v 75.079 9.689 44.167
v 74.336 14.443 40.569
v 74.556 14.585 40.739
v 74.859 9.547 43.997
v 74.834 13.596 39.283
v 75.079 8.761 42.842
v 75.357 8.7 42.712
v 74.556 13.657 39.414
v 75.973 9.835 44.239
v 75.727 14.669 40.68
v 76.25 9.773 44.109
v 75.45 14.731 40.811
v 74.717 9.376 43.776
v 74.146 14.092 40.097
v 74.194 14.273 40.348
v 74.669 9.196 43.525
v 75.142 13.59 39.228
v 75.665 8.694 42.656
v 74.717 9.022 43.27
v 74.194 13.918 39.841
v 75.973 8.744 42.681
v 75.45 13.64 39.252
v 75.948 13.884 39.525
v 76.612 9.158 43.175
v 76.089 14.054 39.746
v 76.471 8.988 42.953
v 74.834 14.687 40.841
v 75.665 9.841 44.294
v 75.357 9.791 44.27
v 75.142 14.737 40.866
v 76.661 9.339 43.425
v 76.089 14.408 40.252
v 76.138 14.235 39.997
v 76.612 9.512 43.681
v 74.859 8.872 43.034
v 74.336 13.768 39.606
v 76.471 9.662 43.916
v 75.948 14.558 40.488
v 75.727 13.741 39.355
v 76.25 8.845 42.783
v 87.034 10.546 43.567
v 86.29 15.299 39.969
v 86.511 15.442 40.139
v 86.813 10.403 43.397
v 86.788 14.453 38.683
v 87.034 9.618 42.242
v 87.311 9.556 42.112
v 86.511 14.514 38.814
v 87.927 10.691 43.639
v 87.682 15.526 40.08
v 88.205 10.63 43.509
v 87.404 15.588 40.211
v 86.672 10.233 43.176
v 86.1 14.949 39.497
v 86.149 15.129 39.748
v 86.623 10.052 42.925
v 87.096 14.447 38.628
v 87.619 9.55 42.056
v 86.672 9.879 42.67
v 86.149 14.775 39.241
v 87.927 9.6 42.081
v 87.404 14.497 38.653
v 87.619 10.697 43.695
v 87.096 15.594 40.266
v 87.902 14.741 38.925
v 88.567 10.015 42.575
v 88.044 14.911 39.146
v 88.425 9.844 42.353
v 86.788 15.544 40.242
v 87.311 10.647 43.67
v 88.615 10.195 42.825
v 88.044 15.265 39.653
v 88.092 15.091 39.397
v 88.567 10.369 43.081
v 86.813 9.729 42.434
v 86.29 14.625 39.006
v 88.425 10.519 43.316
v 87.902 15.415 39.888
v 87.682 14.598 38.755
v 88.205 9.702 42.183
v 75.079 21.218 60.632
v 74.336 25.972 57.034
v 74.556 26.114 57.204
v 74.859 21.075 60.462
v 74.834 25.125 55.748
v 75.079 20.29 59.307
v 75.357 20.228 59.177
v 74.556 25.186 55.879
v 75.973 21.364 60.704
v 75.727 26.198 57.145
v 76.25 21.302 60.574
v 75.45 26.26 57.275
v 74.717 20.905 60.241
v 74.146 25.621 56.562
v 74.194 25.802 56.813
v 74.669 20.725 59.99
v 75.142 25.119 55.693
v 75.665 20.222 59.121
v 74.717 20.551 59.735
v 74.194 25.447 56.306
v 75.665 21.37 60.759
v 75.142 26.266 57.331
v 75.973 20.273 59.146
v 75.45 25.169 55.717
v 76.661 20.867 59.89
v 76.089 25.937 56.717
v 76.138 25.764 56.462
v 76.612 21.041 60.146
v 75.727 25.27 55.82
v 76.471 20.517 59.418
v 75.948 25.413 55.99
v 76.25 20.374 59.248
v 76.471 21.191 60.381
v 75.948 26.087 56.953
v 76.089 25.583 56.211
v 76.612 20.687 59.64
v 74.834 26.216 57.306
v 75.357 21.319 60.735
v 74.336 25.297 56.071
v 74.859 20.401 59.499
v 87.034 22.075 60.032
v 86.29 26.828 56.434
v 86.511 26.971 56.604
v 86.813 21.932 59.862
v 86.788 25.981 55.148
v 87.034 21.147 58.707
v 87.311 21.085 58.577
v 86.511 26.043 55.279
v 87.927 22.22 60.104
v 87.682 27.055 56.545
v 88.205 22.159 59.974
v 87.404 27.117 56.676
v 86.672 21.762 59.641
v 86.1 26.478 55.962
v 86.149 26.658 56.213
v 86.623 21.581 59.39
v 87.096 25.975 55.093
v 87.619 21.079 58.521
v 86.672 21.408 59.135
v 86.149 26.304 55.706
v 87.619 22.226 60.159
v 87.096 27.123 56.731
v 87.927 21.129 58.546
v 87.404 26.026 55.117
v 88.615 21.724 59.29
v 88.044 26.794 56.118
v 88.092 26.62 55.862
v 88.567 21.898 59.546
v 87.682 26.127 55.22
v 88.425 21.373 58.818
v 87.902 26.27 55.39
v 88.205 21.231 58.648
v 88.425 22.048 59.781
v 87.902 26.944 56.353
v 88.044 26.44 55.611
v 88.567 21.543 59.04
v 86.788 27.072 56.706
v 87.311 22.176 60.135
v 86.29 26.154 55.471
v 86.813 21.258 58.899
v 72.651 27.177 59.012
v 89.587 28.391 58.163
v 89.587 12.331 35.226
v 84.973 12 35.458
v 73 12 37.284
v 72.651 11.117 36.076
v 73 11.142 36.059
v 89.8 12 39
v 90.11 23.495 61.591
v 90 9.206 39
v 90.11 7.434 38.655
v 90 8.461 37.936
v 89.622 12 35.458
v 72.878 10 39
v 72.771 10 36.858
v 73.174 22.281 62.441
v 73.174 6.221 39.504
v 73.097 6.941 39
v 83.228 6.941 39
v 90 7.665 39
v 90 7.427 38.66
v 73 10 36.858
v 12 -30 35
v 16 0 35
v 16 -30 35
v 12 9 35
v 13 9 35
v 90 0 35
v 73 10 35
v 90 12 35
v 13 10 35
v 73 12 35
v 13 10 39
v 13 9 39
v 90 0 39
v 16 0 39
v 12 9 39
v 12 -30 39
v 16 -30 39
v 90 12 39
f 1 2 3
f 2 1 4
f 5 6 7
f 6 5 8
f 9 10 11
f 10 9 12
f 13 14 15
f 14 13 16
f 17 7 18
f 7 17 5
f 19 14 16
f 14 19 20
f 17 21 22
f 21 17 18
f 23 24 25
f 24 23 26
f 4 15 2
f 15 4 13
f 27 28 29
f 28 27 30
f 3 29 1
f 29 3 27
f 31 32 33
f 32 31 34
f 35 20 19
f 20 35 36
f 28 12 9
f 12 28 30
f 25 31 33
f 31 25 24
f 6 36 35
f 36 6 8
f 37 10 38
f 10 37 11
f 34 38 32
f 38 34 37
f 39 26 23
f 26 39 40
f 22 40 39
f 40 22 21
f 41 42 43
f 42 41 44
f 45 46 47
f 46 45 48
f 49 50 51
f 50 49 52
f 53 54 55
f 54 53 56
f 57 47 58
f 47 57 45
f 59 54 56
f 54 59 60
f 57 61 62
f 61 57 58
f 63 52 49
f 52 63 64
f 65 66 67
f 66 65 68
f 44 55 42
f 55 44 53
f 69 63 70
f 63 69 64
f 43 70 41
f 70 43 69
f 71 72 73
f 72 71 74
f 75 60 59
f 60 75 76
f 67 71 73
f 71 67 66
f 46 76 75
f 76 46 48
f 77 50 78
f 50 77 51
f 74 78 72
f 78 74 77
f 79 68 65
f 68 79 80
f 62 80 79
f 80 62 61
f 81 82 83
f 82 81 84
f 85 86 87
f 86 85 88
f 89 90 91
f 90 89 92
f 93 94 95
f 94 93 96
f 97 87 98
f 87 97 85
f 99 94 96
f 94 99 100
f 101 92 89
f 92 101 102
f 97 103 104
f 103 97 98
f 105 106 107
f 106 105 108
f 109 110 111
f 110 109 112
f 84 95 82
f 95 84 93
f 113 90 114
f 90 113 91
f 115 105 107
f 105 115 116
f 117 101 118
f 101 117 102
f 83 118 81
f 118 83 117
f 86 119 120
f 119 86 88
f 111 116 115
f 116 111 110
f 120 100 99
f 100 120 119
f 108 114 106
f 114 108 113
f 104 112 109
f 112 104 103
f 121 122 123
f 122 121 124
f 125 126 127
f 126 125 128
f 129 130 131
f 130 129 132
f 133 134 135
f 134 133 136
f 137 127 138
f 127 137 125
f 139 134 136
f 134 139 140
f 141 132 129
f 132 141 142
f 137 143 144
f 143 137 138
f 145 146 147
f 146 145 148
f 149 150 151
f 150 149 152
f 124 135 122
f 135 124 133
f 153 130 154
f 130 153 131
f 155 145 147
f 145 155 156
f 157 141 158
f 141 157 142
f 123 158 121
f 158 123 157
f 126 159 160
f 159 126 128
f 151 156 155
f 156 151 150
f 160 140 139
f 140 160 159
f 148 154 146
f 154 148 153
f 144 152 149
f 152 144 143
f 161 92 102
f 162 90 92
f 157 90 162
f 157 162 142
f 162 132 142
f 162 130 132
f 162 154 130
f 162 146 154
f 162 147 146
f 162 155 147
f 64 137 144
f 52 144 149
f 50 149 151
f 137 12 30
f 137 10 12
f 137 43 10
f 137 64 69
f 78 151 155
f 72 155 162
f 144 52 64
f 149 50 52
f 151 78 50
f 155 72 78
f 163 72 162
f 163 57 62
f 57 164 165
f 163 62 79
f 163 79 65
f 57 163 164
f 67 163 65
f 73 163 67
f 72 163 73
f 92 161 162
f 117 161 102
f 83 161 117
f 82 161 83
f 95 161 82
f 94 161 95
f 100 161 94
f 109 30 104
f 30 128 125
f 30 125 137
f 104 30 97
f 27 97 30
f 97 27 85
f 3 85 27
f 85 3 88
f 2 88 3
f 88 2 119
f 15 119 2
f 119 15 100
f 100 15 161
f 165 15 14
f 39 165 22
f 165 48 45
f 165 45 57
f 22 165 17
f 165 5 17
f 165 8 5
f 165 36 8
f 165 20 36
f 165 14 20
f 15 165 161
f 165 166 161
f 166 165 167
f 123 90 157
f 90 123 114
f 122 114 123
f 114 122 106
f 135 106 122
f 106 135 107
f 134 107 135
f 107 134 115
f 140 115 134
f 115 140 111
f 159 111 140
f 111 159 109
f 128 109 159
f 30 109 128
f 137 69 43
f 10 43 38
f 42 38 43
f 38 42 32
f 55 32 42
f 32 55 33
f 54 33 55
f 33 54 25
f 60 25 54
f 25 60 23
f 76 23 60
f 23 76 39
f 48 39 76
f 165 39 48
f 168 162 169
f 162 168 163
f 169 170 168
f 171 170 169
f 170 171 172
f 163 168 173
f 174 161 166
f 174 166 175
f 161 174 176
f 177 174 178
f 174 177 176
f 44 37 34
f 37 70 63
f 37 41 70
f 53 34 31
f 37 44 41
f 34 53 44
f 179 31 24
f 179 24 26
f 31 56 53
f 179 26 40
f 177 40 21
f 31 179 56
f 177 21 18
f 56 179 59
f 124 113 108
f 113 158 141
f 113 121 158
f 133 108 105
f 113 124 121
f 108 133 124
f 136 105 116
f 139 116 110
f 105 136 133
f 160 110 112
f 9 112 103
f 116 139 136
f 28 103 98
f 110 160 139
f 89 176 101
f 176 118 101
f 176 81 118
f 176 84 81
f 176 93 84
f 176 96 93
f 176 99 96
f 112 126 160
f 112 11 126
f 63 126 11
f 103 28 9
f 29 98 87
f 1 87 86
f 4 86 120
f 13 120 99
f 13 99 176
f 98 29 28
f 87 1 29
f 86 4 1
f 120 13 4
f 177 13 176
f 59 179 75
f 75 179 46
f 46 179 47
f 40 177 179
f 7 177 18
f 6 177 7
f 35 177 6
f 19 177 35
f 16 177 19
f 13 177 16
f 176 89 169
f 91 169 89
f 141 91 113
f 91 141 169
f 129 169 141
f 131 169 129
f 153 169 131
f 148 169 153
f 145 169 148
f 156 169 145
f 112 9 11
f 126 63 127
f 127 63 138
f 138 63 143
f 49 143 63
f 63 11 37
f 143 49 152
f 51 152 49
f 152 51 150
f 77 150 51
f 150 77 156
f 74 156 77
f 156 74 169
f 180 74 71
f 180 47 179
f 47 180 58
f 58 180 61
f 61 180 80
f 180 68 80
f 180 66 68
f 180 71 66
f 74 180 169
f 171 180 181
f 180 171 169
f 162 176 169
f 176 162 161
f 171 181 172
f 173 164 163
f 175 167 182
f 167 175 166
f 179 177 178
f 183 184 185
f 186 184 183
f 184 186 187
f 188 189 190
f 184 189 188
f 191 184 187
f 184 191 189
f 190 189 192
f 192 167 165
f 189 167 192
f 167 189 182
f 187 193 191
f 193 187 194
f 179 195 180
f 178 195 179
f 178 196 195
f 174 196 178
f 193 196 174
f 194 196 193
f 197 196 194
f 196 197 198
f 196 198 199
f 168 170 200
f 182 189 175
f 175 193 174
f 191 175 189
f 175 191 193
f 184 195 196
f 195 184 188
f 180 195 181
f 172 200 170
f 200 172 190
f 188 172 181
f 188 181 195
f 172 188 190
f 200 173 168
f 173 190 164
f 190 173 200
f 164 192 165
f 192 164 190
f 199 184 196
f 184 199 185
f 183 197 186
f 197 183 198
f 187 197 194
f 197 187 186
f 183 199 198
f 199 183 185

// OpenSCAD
tw=10;
ext=40;
lift=tw+2;
rotate([0,90])
{
  *union(){
  cube([30,tw,9]);
  translate([30,0,-2]) cube([4,tw,11]);
  rotate([90,0,180]) linear_extrude(tw) polygon([[0,0],[0,15],[19,15]]);
  *cube([4,tw,19]);
  translate([-1*ext+1,0,-2]) cube([11,tw+lift+16,17]);
translate([5-ext,0,13]) cube([ext,tw,3.5]);
  translate([8-ext,0]) {
  translate([0,0,18]) cube([4,26+lift,2]);
  translate([0,0,13]) cube([4,tw,6]);
  translate([0,0,14.5]) cube([4,26+lift,2]);
    translate([-3,2,16.5]) rotate([90,0]) linear_extrude(2) polygon([[0,0],[0,11],[11,0]]);
  }
}
translate([ext*-1+1,0,13]) {
  difference(){
    cube([4,tw,60]);
    *translate([-.01,10,50]) rotate([0,90,0]) cylinder(d=4,h=5,$fn=30);
  }
  translate([0,0,60]) cube([4,lift,17]);
  translate([0,lift]) translate([-1,-3,60]) {
    //intersection()
    {
      //translate([-8,0]) cube([20,30,20]);
      rotate([0,5,55]) difference(){
        translate([-2,-2,0]) cube([6,28,17]);
        translate([0,0,.5]) for(x=[3,23.1],y=[2,14]) translate([-5,x,y]) rotate([0,90]) cylinder(d=2,h=15,$fn=20);
      }
    }
  }
}
translate([-1*ext+1,0,12]) {
  *cube([30,4,4]);
  translate([0,-30,0]) cube([4,39,4]);
  *translate([-26,0]) cube([30,4,4]);
}
}
